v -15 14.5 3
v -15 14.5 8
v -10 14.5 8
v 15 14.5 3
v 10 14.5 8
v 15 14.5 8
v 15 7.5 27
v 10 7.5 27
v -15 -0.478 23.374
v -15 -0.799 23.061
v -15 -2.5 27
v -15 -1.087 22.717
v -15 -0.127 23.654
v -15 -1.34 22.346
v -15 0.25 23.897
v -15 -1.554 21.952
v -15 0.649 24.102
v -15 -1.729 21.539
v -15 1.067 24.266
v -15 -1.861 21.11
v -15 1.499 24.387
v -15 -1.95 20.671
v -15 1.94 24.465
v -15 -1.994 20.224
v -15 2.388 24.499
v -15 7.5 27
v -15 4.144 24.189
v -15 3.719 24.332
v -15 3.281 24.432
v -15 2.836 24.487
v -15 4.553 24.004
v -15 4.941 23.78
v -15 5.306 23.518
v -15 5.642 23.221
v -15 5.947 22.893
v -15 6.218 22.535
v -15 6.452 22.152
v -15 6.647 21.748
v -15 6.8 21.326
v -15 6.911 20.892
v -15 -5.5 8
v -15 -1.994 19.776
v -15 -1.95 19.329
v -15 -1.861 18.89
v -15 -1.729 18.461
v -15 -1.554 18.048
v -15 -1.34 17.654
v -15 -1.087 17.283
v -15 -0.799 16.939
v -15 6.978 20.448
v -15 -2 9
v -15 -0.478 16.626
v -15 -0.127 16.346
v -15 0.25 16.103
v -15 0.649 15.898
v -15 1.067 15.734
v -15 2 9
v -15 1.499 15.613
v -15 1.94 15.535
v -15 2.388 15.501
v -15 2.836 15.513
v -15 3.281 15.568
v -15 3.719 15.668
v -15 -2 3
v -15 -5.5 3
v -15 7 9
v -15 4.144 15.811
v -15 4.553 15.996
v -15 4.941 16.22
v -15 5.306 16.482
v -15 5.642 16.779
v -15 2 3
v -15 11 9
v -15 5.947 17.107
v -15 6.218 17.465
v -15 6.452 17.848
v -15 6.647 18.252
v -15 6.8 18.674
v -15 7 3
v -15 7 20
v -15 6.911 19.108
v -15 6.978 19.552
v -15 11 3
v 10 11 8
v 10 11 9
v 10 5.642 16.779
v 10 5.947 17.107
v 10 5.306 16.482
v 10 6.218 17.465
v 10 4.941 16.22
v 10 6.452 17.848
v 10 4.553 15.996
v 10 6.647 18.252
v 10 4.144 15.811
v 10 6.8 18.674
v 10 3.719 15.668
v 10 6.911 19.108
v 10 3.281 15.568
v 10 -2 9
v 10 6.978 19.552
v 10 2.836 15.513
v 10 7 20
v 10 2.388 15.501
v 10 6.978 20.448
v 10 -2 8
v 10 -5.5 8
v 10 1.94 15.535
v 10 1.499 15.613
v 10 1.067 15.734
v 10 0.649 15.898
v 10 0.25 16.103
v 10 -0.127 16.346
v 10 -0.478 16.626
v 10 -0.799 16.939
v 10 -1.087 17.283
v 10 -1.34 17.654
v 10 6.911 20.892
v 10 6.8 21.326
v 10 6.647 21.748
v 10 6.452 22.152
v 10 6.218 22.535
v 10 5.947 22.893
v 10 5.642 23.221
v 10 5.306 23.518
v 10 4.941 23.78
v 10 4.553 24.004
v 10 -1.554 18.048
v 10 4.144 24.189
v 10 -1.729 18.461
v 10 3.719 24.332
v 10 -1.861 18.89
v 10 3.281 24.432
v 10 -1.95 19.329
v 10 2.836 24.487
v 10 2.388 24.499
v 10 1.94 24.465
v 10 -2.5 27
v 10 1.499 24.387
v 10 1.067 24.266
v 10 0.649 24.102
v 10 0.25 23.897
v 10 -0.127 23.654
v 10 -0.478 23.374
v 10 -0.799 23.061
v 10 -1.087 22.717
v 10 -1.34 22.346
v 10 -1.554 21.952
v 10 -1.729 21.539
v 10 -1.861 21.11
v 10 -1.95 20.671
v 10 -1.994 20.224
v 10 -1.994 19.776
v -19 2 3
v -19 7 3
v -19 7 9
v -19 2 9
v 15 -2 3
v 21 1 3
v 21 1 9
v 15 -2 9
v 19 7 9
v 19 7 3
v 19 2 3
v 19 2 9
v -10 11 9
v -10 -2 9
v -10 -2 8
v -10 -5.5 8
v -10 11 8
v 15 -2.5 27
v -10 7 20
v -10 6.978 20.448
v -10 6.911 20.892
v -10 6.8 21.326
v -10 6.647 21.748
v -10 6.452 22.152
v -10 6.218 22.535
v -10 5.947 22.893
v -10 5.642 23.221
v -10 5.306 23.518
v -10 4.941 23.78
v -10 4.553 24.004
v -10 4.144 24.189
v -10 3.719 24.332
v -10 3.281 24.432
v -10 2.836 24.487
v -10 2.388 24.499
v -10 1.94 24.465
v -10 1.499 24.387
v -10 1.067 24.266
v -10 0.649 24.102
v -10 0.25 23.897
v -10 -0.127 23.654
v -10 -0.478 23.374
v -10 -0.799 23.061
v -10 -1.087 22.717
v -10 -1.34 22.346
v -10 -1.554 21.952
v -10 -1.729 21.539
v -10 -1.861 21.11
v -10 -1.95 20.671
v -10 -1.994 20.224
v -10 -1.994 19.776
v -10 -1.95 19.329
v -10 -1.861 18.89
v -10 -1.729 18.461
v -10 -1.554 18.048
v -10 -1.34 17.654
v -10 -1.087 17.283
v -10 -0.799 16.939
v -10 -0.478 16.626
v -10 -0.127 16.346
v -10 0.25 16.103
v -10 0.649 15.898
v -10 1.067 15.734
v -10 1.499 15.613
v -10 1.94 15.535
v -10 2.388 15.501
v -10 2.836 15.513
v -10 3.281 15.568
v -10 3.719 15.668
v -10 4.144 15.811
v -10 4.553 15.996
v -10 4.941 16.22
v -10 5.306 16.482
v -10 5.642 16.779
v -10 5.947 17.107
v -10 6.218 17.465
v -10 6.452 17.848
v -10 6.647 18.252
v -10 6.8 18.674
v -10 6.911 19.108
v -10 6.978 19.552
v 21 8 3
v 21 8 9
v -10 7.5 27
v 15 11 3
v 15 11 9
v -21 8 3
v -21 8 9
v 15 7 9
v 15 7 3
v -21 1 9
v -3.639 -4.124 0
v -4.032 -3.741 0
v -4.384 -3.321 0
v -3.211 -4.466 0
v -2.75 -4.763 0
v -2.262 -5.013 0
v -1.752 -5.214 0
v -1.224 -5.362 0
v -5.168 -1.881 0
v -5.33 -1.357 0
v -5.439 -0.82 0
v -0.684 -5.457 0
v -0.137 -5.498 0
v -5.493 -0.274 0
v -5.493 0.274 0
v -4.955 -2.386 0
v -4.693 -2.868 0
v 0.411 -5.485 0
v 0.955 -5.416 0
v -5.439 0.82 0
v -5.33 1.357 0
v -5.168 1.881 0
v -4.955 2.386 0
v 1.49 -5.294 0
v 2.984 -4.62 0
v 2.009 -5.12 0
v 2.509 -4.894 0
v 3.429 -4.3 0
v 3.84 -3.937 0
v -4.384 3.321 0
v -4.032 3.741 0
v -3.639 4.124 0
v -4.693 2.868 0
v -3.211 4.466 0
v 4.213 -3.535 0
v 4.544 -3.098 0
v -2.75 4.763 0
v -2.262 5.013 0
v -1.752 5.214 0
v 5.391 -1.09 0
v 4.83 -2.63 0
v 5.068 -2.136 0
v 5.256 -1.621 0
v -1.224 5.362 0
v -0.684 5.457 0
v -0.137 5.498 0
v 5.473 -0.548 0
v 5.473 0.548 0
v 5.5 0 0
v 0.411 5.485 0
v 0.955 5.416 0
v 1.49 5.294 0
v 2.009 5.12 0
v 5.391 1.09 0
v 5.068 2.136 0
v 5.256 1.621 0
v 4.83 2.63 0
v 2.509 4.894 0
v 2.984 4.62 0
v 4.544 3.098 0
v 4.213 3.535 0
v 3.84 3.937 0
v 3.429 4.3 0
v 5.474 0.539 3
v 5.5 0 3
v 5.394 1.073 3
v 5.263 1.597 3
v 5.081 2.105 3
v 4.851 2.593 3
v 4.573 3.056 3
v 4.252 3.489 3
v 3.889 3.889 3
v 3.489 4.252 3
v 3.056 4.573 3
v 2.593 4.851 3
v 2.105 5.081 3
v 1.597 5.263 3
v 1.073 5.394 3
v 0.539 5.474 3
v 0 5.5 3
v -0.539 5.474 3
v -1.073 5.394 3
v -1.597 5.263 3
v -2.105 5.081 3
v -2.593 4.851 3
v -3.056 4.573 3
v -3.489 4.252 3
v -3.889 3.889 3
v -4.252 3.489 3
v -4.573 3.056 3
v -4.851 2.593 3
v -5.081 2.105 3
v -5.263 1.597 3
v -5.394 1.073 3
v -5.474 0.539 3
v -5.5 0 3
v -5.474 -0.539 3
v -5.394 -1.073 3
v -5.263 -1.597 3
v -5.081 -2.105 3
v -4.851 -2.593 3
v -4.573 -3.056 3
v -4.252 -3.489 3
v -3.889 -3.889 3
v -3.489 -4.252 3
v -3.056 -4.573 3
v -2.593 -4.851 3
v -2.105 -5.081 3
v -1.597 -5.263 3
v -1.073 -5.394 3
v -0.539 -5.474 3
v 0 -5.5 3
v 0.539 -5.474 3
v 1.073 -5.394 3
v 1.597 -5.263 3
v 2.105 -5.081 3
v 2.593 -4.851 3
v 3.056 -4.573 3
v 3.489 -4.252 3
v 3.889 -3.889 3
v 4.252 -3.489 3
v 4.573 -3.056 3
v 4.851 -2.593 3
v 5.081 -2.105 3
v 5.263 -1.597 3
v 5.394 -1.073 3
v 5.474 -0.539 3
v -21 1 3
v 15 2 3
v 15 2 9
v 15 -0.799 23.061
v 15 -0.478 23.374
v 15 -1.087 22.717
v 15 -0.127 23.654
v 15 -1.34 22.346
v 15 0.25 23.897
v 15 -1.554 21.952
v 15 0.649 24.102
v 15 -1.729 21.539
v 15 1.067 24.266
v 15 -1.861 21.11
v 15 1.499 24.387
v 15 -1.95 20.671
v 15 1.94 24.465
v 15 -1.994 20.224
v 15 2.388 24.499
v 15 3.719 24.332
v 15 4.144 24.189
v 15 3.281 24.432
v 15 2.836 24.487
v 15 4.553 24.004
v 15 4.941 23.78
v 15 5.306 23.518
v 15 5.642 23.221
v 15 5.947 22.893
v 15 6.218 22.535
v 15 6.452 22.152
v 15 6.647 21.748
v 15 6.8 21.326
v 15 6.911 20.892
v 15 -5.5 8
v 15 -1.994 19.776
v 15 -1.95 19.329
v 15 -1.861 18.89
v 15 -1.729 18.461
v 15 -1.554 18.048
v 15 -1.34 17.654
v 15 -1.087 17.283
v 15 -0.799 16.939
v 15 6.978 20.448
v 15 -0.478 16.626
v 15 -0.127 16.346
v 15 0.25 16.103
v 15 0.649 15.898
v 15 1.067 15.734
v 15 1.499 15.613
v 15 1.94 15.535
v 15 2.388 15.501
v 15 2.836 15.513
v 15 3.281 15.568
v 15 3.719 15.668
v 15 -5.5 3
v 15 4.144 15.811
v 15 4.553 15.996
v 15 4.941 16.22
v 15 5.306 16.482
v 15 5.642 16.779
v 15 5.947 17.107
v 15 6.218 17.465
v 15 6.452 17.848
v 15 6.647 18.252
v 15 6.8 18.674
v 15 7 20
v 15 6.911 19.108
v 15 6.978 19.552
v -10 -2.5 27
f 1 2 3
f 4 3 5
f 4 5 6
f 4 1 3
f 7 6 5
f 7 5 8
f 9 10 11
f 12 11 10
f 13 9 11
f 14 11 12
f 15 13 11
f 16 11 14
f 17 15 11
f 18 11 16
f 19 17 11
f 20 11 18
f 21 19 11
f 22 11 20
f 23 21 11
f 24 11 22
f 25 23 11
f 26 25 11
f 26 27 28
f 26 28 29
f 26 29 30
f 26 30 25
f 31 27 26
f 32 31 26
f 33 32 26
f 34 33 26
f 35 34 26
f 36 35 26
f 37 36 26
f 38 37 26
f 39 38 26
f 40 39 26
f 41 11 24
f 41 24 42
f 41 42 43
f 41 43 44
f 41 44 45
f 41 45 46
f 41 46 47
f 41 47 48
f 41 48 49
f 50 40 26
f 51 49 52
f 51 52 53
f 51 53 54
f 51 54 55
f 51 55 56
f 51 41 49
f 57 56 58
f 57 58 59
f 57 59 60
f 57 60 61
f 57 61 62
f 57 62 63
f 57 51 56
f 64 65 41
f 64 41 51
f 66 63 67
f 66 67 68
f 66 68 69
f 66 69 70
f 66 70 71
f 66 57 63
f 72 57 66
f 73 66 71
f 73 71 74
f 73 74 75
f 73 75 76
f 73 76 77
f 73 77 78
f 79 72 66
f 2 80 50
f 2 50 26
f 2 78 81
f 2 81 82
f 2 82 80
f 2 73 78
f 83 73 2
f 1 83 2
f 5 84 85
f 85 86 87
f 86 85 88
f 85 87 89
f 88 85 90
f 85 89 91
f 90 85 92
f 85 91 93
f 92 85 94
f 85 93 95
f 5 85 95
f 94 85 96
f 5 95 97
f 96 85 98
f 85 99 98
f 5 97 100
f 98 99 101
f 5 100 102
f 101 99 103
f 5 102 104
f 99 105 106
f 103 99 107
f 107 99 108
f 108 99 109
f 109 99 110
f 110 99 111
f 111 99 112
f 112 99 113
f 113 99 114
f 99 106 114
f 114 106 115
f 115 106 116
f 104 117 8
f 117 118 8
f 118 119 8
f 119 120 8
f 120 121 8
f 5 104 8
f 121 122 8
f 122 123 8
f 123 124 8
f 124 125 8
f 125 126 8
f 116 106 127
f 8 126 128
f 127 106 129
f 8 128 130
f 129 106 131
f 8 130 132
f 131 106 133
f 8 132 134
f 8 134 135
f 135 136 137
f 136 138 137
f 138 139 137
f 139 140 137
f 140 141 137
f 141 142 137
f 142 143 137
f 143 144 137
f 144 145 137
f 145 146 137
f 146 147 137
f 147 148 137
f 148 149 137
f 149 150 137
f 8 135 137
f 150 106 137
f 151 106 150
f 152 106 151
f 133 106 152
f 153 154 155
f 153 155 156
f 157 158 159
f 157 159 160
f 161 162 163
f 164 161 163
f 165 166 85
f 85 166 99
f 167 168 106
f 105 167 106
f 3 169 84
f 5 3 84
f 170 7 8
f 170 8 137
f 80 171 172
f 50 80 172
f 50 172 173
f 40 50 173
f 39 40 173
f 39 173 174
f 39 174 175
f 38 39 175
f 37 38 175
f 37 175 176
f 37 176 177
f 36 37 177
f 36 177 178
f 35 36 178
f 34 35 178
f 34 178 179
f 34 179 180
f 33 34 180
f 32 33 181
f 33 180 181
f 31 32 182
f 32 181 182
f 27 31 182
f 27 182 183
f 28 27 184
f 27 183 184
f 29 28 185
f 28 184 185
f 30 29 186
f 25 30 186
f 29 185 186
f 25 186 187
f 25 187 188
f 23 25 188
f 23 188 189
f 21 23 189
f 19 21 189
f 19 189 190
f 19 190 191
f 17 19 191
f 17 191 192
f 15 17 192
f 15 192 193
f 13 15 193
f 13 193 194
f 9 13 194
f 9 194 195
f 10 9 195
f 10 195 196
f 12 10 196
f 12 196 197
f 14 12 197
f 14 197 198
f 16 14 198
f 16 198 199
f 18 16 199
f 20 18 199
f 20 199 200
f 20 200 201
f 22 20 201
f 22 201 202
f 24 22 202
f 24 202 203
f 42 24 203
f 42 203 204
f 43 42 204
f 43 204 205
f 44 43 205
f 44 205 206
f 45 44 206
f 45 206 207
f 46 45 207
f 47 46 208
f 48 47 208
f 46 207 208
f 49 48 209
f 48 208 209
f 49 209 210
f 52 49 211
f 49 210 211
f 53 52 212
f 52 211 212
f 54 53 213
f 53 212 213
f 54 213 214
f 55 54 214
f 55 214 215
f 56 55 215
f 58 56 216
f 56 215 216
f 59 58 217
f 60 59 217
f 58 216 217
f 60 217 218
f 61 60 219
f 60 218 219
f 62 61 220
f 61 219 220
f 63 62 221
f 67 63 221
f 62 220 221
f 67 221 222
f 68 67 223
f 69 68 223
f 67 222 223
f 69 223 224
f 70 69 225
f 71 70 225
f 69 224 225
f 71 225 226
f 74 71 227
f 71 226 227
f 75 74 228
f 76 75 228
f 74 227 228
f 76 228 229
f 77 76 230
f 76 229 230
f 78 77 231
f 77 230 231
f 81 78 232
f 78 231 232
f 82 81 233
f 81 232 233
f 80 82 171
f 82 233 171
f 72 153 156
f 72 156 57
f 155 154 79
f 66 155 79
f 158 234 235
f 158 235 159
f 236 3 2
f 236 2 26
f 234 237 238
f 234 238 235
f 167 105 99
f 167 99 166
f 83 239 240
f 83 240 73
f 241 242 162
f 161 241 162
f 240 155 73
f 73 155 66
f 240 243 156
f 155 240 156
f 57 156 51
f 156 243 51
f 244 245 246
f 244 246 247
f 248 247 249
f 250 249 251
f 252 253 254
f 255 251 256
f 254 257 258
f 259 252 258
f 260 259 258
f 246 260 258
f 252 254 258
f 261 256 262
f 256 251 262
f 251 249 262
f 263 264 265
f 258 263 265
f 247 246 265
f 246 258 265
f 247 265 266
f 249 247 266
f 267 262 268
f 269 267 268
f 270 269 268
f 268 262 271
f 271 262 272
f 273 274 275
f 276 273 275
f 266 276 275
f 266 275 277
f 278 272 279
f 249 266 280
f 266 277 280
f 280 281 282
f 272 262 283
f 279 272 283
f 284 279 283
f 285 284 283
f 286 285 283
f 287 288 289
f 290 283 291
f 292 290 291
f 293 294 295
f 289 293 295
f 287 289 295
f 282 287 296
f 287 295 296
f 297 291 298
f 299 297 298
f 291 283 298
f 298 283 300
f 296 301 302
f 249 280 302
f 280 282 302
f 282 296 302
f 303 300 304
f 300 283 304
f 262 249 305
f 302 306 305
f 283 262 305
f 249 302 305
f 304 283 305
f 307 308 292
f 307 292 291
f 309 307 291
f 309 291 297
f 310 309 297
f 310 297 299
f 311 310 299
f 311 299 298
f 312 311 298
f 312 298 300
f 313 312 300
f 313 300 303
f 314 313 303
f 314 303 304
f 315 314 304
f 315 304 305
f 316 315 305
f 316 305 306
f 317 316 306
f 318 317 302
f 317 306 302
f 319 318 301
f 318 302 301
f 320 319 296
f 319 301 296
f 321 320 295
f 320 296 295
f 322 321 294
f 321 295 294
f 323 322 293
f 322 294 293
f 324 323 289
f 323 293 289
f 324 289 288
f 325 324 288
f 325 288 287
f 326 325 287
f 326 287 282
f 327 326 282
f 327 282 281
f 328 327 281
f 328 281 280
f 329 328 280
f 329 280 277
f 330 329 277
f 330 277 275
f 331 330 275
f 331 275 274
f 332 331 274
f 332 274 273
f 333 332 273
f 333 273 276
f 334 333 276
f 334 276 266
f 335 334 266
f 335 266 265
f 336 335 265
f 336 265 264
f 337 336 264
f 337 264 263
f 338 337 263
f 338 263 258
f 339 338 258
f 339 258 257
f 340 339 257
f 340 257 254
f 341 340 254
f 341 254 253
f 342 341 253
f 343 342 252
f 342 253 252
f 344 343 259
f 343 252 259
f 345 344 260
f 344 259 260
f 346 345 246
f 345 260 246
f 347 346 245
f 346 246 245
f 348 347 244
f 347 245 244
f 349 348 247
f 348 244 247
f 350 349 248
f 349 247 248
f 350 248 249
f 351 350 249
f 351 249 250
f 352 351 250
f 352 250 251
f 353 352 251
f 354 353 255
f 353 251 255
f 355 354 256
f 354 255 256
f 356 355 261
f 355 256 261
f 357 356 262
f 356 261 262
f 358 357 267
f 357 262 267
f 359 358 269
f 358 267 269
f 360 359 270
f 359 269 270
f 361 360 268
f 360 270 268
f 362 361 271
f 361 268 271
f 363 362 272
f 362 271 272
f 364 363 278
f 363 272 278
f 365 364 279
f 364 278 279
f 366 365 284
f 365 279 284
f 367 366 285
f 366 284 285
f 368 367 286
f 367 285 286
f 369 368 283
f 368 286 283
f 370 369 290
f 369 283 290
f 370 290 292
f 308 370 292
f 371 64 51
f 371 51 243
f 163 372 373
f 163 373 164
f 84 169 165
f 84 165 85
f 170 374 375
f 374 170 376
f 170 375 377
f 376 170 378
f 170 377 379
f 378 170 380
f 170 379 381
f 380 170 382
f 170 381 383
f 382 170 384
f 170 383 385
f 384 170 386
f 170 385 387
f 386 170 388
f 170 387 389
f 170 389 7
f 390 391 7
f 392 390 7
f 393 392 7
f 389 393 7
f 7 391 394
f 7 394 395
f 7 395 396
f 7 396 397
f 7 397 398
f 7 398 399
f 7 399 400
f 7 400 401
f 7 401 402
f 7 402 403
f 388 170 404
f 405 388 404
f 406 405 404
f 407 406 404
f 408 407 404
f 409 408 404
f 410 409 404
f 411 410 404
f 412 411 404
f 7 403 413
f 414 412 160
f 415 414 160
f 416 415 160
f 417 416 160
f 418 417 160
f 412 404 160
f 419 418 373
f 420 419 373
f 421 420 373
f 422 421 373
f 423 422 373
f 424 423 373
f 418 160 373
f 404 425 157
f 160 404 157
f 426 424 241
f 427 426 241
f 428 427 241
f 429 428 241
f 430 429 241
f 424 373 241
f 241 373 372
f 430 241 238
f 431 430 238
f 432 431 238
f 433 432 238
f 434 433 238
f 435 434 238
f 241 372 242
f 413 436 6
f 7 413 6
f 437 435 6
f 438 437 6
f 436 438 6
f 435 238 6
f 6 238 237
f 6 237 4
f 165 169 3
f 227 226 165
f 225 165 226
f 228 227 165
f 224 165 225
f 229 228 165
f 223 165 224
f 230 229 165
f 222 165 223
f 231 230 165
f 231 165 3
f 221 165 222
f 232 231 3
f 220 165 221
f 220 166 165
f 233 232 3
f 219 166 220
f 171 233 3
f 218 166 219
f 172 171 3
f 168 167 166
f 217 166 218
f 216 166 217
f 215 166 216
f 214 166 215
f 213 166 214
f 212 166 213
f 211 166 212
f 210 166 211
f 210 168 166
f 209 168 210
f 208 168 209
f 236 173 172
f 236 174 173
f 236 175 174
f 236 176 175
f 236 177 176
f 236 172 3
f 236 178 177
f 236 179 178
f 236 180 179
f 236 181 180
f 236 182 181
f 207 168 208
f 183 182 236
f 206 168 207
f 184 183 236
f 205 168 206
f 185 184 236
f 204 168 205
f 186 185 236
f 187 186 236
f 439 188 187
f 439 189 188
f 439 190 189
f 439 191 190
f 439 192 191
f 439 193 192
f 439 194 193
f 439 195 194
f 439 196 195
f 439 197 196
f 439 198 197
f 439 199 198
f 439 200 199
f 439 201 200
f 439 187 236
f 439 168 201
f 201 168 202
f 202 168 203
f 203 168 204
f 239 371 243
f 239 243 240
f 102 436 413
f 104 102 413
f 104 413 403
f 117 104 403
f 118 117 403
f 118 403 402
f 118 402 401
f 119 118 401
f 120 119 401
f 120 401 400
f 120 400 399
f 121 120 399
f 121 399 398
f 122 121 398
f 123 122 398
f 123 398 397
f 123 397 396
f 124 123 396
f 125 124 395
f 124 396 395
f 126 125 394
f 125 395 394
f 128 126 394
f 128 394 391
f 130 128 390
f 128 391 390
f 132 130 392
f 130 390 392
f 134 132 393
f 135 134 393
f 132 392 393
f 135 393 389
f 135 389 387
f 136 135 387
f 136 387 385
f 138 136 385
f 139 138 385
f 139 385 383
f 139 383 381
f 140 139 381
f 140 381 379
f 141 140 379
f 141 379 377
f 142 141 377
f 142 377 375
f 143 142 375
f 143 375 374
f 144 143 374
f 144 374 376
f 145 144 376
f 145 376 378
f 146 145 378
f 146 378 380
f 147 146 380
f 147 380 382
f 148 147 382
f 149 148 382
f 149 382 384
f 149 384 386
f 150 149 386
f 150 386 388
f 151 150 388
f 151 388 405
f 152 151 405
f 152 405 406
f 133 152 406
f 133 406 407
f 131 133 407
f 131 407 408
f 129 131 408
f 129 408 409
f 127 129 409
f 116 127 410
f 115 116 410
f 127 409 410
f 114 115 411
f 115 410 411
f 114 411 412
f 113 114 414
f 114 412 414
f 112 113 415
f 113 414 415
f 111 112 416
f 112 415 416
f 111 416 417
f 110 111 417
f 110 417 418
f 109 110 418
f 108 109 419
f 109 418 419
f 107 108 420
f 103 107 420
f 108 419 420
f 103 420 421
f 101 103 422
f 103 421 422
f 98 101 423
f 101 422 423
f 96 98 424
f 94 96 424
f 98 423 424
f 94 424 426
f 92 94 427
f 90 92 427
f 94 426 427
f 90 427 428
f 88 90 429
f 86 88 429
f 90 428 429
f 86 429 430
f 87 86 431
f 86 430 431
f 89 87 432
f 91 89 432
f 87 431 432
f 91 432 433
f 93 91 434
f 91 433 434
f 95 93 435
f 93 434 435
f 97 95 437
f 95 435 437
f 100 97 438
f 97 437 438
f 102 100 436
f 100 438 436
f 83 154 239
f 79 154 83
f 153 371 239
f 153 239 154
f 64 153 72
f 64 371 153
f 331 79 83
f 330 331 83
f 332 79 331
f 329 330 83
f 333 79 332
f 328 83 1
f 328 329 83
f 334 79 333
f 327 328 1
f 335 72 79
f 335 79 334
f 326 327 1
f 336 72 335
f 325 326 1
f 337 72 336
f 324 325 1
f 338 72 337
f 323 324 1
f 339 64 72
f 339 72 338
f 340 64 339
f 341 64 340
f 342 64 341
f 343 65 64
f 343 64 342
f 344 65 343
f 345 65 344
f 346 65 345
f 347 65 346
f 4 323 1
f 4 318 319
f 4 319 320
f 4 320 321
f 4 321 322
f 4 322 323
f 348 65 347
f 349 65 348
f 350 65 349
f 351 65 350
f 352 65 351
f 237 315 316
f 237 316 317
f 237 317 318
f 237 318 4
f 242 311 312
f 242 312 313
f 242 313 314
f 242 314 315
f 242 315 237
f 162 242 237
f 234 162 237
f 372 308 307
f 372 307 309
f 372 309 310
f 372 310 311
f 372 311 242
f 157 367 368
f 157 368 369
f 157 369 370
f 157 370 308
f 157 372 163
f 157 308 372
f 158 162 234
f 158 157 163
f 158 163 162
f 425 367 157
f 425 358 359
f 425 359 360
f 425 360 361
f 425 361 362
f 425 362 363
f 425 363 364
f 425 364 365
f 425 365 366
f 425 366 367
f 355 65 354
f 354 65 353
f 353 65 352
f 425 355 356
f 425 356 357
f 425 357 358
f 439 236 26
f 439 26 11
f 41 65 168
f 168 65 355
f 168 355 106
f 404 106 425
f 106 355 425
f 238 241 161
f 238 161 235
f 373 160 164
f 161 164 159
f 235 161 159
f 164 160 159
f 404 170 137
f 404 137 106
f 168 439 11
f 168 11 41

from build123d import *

# Parameters (mm, degrees)
SKETCH_R     = 5.5
PAD_DEPTH    = 3
SKETCH001_W  = 30
SKETCH001_H  = 20
PAD001_DEPTH = 5
SKETCH002_R  = 4.5
PAD002_DEPTH = 30
SKETCH003_W  = 20
SKETCH003_H  = 19
POCKET_DEPTH = 20.001
SKETCH004_W  = 4
SKETCH004_H  = 5
PAD003_DEPTH = 6


with BuildPart() as part:
    # Sketch → Pad (new body)
    with BuildSketch(Plane.XY):
        Circle(SKETCH_R)
    extrude(amount=PAD_DEPTH)

    # Sketch001 (on Face3 of Pad) → Pad001 (join)
    with BuildSketch(Plane.XY.offset(3)):
        with Locations((0, 4.5)):
            Rectangle(SKETCH001_W, SKETCH001_H)
    extrude(amount=PAD001_DEPTH)

    # Sketch002 (on Face6 of Pad001) → Pad002 (join)
    with BuildSketch(Plane.YZ.offset(15)):
        Polygon((-5.5, 7), (14.5, 7), (14.5, 8), (7.5, 27), (-2.5, 27), (-5.5, 8), align=None)
        with Locations((2.5, 20)):
            Circle(SKETCH002_R, mode=Mode.SUBTRACT)
    extrude(amount=-PAD002_DEPTH)

    # Sketch003 (on Face5 of Pad002) → Pocket (cut, through all)
    with BuildSketch(Plane.XZ.offset(5.5)):
        with Locations((0, 17.5)):
            Rectangle(SKETCH003_W, SKETCH003_H)
    extrude(amount=-POCKET_DEPTH, mode=Mode.SUBTRACT)

    # Sketch004 (on DatumPlane) → Pad003 (join)
    with BuildSketch(Plane(origin=(0, 0, 3), x_dir=(1, 0, 0), z_dir=(0, 0, -1))):
        Polygon((-15, 2), (-21, -1), (-21, -8), (-15, -11), (15, -11), (21, -8), (21, -1), (15, 2), align=None)
        with Locations((-17, -4.5)):
            Rectangle(SKETCH004_W, SKETCH004_H, mode=Mode.SUBTRACT)
        with Locations((17, -4.5)):
            Rectangle(SKETCH004_W, SKETCH004_H, mode=Mode.SUBTRACT)
    extrude(amount=-PAD003_DEPTH)


solid = part.part
